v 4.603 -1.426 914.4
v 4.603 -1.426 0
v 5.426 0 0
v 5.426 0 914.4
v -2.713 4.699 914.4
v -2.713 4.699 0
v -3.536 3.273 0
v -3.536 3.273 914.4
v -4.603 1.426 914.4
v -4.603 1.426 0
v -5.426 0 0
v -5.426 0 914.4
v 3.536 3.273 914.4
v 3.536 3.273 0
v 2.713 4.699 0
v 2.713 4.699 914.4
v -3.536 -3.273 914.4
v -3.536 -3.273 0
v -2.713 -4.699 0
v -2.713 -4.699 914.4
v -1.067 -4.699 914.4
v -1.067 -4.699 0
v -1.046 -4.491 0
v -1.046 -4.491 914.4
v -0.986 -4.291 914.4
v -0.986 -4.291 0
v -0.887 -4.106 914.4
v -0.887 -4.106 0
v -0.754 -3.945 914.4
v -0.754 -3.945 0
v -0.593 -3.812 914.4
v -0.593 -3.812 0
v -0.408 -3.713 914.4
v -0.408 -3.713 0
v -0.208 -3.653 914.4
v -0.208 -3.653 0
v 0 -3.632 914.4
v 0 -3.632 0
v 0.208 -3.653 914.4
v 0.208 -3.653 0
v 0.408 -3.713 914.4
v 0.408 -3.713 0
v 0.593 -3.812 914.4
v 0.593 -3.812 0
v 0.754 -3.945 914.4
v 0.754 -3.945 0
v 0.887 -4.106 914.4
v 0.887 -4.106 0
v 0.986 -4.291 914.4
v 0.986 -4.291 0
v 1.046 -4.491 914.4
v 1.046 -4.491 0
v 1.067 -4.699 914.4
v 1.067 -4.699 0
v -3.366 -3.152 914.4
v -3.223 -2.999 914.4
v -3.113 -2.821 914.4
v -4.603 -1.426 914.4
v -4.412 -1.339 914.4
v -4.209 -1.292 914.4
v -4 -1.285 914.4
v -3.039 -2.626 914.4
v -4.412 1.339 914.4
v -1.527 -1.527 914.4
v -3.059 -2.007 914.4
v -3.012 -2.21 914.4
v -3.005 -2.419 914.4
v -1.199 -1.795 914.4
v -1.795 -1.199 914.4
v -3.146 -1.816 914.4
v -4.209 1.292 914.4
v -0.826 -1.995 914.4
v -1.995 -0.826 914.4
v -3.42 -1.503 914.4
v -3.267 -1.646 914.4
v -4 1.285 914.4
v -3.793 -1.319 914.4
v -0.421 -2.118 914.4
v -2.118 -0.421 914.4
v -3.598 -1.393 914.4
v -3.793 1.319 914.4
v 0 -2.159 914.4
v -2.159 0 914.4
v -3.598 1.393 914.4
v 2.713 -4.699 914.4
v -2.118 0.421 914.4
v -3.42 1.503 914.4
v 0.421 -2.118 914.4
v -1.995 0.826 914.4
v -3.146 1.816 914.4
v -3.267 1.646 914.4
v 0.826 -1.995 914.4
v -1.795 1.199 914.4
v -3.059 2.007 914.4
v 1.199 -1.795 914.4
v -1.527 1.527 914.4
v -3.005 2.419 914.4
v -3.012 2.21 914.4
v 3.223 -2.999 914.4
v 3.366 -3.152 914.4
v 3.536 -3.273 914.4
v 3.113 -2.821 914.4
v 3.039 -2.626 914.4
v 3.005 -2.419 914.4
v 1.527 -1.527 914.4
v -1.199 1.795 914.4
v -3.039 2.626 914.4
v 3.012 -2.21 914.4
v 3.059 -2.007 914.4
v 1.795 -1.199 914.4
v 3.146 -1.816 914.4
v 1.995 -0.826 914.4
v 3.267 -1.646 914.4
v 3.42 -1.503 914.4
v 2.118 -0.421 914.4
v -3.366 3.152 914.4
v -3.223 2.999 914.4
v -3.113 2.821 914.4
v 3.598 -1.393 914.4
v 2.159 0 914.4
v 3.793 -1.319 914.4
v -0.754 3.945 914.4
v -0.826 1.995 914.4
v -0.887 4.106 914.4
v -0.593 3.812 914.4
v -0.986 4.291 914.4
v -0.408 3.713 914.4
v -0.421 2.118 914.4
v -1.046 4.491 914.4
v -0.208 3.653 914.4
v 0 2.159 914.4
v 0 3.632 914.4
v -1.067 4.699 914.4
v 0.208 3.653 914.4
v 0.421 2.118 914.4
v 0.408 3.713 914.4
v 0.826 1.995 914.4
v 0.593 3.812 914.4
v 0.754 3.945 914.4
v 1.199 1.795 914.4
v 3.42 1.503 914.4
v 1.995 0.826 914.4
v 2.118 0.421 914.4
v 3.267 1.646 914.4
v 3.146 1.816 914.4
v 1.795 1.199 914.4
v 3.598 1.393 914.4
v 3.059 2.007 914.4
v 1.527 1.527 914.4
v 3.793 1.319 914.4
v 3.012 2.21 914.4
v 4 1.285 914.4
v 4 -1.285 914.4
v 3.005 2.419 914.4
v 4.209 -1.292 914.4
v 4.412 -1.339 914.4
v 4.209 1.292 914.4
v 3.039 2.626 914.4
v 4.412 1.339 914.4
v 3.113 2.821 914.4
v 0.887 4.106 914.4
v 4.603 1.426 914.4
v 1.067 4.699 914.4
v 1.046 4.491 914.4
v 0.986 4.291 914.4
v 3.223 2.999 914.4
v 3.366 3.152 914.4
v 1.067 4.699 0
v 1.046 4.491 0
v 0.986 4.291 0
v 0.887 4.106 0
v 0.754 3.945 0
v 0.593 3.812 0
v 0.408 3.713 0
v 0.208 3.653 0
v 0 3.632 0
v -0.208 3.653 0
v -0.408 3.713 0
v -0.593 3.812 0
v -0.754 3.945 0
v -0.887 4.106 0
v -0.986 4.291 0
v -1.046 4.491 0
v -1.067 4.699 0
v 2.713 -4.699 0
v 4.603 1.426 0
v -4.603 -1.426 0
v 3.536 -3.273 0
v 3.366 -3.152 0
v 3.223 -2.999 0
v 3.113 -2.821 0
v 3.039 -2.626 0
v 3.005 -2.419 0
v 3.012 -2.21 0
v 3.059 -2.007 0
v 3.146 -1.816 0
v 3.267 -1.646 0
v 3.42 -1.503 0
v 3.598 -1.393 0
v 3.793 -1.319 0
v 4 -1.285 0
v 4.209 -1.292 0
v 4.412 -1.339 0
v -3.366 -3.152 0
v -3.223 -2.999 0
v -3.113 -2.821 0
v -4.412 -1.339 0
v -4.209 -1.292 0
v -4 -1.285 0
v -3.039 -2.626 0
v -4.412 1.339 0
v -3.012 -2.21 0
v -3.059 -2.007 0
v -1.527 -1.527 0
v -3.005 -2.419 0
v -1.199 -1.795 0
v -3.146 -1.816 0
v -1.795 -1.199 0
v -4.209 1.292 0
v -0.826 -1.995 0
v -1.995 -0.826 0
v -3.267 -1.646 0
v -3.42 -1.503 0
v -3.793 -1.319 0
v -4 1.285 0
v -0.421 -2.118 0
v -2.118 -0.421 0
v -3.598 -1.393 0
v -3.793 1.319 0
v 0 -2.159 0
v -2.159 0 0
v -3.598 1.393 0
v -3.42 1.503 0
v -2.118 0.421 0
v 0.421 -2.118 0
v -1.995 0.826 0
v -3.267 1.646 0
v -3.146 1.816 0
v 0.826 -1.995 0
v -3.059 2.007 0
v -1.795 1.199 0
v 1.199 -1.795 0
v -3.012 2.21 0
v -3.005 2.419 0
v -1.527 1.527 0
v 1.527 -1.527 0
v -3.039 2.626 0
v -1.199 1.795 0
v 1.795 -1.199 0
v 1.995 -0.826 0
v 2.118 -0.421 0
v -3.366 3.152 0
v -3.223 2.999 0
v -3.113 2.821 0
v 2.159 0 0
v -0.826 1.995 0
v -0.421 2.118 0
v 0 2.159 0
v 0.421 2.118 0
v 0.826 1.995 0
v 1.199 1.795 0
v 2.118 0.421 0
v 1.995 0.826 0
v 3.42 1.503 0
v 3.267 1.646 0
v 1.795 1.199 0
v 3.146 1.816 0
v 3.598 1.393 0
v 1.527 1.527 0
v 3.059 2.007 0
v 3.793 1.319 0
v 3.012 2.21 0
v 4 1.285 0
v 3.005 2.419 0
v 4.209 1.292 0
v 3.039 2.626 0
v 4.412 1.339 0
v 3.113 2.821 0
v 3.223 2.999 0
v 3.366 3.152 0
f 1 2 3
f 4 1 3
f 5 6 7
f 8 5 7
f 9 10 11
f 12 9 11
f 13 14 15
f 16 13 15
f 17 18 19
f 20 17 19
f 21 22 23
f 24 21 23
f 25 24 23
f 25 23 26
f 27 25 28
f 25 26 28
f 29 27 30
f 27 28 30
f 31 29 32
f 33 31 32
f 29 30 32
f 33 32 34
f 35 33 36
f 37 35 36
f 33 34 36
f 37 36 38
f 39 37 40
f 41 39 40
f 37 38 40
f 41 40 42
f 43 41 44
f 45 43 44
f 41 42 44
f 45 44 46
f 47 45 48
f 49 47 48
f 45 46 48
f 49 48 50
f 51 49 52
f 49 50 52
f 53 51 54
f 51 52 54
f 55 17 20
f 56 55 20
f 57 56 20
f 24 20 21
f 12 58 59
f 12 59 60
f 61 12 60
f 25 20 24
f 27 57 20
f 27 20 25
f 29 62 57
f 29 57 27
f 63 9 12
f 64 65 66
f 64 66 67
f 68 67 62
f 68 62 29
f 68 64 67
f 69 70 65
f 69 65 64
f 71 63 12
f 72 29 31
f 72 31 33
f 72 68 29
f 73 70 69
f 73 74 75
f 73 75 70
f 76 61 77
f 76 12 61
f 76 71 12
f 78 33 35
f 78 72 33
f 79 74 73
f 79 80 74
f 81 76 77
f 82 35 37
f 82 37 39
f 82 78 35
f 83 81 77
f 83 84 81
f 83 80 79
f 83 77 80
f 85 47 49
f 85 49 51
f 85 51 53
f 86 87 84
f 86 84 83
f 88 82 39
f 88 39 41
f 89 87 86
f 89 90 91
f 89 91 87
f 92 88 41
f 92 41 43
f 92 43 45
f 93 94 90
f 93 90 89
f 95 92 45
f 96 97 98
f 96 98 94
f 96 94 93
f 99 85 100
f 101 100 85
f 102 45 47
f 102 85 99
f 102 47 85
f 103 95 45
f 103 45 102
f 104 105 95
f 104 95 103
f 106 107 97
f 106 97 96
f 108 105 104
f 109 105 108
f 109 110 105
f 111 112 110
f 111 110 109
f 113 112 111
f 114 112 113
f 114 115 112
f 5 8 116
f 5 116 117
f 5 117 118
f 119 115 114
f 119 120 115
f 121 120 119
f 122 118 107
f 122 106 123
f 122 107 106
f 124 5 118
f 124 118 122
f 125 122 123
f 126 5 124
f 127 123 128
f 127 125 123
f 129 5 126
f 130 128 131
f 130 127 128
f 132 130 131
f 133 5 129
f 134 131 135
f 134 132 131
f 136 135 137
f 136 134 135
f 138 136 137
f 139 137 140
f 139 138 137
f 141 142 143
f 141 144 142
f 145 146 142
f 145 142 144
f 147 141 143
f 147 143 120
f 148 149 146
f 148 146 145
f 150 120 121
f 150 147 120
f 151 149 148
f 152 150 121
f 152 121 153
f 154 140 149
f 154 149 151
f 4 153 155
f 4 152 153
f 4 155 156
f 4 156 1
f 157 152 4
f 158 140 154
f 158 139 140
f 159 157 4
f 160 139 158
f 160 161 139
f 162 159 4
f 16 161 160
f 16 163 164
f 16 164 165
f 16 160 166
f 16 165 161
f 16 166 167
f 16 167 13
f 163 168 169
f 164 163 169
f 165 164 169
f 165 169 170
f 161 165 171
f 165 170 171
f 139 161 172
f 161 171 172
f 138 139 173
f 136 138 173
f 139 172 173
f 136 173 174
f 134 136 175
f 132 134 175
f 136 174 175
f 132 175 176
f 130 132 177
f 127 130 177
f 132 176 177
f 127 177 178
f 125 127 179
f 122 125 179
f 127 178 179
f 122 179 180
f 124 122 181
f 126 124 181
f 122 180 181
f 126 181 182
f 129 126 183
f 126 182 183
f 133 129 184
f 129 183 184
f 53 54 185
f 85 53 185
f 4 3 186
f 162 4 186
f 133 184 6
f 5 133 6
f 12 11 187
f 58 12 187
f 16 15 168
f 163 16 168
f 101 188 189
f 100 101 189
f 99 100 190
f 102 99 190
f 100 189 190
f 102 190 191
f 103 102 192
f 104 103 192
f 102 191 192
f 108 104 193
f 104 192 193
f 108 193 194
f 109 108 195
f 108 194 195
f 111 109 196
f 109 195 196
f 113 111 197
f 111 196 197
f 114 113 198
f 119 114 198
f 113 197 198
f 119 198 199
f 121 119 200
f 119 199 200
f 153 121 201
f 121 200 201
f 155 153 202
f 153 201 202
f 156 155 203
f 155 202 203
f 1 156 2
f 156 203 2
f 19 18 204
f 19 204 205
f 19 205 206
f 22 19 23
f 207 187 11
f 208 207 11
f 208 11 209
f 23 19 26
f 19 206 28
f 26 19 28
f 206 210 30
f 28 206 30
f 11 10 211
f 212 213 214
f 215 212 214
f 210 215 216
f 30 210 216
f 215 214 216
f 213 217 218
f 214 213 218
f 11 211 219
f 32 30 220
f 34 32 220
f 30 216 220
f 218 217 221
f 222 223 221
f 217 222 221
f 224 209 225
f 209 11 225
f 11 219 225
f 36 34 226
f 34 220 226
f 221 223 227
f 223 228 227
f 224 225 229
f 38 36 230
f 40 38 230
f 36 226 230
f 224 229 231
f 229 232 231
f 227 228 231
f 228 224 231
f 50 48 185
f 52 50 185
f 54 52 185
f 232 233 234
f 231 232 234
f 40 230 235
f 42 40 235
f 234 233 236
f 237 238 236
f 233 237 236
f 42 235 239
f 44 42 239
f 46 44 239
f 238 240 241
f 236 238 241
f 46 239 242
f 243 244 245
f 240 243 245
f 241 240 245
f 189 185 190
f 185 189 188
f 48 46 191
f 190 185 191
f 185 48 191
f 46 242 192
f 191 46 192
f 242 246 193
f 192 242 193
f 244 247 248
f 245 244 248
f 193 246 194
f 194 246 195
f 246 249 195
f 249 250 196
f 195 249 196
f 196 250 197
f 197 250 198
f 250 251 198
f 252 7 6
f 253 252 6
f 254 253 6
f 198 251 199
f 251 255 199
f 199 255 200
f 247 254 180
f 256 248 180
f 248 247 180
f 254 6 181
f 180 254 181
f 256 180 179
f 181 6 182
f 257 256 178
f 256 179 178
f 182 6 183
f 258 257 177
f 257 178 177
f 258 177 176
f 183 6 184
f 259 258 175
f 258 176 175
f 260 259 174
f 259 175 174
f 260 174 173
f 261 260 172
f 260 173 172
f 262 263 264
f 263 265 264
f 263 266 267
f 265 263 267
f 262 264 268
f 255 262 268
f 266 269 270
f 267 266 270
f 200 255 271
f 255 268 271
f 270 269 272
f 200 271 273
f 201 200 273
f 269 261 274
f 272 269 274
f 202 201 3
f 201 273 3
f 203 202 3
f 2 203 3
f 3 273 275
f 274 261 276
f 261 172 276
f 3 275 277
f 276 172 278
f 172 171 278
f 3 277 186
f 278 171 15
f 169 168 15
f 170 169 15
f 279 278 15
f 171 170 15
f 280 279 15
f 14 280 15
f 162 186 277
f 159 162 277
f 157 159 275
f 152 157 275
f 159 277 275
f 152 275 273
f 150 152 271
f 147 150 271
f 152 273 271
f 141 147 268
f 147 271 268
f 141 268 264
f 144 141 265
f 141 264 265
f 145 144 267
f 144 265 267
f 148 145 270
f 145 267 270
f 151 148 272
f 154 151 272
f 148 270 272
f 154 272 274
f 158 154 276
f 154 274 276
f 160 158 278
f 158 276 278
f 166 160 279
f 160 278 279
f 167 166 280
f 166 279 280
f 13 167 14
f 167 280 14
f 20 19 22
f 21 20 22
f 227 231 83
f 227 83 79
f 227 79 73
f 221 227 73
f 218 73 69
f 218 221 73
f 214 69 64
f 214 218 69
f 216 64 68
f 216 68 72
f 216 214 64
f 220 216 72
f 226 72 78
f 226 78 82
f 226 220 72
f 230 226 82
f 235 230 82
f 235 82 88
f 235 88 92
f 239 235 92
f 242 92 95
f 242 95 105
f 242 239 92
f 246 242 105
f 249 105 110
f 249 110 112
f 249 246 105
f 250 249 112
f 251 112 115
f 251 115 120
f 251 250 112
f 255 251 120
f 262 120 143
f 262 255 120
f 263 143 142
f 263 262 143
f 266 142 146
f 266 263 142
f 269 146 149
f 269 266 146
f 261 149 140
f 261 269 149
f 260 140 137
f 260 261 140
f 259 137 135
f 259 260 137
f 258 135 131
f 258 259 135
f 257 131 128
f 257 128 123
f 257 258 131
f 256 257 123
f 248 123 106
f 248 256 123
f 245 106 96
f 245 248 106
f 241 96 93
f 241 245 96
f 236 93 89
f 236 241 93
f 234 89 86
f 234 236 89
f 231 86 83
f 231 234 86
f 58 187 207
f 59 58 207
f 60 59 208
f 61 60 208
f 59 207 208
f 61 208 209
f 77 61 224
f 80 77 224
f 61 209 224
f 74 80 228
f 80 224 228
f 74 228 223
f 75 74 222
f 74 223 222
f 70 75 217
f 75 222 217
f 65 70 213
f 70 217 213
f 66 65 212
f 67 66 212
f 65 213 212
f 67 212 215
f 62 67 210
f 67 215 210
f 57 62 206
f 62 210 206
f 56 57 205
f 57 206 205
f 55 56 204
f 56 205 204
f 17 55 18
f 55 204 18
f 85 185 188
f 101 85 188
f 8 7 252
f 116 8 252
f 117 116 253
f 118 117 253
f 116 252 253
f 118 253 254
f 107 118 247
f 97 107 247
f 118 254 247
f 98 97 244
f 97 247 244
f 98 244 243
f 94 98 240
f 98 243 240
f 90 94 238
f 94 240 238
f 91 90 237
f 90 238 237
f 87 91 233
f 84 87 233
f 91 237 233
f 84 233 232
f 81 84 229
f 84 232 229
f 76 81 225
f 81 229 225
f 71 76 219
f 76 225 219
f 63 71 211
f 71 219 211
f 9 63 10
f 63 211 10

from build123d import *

# Parameters (mm, degrees)
SKETCH1_R           = 2.159
BOSS_EXTRUDE1_DEPTH = 914.4


with BuildPart() as part:
    # Sketch1 → Boss-Extrude1 (new body)
    with BuildSketch(Plane.XY):
        with BuildLine():
            Line((3.536053372, 3.273375901), (2.712968915, 4.699))
            Line((2.712968915, 4.699), (1.0668, 4.699))
            ThreePointArc((1.0668, 4.699), (0, 3.6322), (-1.0668, 4.699))
            Line((-1.0668, 4.699), (-2.712968915, 4.699))
            Line((-2.712968915, 4.699), (-3.536053372, 3.273375901))
            ThreePointArc((-3.536053372, 3.273375901), (-3.145577472, 1.8161), (-4.602853372, 1.425624099))
            Line((-4.602853372, 1.425624099), (-5.42593783, 0))
            Line((-5.42593783, 0), (-4.602853372, -1.425624099))
            ThreePointArc((-4.602853372, -1.425624099), (-3.145577472, -1.8161), (-3.536053372, -3.273375901))
            Line((-3.536053372, -3.273375901), (-2.712968915, -4.699))
            Line((-2.712968915, -4.699), (-1.0668, -4.699))
            ThreePointArc((-1.0668, -4.699), (0, -3.6322), (1.0668, -4.699))
            Line((1.0668, -4.699), (2.712968915, -4.699))
            Line((2.712968915, -4.699), (3.536053372, -3.273375901))
            ThreePointArc((3.536053372, -3.273375901), (3.145577472, -1.8161), (4.602853372, -1.425624099))
            Line((4.602853372, -1.425624099), (5.42593783, 0))
            Line((5.42593783, 0), (4.602853372, 1.425624099))
            ThreePointArc((4.602853372, 1.425624099), (3.145577472, 1.8161), (3.536053372, 3.273375901))
        make_face()
        Circle(SKETCH1_R, mode=Mode.SUBTRACT)
    extrude(amount=BOSS_EXTRUDE1_DEPTH)


solid = part.part
